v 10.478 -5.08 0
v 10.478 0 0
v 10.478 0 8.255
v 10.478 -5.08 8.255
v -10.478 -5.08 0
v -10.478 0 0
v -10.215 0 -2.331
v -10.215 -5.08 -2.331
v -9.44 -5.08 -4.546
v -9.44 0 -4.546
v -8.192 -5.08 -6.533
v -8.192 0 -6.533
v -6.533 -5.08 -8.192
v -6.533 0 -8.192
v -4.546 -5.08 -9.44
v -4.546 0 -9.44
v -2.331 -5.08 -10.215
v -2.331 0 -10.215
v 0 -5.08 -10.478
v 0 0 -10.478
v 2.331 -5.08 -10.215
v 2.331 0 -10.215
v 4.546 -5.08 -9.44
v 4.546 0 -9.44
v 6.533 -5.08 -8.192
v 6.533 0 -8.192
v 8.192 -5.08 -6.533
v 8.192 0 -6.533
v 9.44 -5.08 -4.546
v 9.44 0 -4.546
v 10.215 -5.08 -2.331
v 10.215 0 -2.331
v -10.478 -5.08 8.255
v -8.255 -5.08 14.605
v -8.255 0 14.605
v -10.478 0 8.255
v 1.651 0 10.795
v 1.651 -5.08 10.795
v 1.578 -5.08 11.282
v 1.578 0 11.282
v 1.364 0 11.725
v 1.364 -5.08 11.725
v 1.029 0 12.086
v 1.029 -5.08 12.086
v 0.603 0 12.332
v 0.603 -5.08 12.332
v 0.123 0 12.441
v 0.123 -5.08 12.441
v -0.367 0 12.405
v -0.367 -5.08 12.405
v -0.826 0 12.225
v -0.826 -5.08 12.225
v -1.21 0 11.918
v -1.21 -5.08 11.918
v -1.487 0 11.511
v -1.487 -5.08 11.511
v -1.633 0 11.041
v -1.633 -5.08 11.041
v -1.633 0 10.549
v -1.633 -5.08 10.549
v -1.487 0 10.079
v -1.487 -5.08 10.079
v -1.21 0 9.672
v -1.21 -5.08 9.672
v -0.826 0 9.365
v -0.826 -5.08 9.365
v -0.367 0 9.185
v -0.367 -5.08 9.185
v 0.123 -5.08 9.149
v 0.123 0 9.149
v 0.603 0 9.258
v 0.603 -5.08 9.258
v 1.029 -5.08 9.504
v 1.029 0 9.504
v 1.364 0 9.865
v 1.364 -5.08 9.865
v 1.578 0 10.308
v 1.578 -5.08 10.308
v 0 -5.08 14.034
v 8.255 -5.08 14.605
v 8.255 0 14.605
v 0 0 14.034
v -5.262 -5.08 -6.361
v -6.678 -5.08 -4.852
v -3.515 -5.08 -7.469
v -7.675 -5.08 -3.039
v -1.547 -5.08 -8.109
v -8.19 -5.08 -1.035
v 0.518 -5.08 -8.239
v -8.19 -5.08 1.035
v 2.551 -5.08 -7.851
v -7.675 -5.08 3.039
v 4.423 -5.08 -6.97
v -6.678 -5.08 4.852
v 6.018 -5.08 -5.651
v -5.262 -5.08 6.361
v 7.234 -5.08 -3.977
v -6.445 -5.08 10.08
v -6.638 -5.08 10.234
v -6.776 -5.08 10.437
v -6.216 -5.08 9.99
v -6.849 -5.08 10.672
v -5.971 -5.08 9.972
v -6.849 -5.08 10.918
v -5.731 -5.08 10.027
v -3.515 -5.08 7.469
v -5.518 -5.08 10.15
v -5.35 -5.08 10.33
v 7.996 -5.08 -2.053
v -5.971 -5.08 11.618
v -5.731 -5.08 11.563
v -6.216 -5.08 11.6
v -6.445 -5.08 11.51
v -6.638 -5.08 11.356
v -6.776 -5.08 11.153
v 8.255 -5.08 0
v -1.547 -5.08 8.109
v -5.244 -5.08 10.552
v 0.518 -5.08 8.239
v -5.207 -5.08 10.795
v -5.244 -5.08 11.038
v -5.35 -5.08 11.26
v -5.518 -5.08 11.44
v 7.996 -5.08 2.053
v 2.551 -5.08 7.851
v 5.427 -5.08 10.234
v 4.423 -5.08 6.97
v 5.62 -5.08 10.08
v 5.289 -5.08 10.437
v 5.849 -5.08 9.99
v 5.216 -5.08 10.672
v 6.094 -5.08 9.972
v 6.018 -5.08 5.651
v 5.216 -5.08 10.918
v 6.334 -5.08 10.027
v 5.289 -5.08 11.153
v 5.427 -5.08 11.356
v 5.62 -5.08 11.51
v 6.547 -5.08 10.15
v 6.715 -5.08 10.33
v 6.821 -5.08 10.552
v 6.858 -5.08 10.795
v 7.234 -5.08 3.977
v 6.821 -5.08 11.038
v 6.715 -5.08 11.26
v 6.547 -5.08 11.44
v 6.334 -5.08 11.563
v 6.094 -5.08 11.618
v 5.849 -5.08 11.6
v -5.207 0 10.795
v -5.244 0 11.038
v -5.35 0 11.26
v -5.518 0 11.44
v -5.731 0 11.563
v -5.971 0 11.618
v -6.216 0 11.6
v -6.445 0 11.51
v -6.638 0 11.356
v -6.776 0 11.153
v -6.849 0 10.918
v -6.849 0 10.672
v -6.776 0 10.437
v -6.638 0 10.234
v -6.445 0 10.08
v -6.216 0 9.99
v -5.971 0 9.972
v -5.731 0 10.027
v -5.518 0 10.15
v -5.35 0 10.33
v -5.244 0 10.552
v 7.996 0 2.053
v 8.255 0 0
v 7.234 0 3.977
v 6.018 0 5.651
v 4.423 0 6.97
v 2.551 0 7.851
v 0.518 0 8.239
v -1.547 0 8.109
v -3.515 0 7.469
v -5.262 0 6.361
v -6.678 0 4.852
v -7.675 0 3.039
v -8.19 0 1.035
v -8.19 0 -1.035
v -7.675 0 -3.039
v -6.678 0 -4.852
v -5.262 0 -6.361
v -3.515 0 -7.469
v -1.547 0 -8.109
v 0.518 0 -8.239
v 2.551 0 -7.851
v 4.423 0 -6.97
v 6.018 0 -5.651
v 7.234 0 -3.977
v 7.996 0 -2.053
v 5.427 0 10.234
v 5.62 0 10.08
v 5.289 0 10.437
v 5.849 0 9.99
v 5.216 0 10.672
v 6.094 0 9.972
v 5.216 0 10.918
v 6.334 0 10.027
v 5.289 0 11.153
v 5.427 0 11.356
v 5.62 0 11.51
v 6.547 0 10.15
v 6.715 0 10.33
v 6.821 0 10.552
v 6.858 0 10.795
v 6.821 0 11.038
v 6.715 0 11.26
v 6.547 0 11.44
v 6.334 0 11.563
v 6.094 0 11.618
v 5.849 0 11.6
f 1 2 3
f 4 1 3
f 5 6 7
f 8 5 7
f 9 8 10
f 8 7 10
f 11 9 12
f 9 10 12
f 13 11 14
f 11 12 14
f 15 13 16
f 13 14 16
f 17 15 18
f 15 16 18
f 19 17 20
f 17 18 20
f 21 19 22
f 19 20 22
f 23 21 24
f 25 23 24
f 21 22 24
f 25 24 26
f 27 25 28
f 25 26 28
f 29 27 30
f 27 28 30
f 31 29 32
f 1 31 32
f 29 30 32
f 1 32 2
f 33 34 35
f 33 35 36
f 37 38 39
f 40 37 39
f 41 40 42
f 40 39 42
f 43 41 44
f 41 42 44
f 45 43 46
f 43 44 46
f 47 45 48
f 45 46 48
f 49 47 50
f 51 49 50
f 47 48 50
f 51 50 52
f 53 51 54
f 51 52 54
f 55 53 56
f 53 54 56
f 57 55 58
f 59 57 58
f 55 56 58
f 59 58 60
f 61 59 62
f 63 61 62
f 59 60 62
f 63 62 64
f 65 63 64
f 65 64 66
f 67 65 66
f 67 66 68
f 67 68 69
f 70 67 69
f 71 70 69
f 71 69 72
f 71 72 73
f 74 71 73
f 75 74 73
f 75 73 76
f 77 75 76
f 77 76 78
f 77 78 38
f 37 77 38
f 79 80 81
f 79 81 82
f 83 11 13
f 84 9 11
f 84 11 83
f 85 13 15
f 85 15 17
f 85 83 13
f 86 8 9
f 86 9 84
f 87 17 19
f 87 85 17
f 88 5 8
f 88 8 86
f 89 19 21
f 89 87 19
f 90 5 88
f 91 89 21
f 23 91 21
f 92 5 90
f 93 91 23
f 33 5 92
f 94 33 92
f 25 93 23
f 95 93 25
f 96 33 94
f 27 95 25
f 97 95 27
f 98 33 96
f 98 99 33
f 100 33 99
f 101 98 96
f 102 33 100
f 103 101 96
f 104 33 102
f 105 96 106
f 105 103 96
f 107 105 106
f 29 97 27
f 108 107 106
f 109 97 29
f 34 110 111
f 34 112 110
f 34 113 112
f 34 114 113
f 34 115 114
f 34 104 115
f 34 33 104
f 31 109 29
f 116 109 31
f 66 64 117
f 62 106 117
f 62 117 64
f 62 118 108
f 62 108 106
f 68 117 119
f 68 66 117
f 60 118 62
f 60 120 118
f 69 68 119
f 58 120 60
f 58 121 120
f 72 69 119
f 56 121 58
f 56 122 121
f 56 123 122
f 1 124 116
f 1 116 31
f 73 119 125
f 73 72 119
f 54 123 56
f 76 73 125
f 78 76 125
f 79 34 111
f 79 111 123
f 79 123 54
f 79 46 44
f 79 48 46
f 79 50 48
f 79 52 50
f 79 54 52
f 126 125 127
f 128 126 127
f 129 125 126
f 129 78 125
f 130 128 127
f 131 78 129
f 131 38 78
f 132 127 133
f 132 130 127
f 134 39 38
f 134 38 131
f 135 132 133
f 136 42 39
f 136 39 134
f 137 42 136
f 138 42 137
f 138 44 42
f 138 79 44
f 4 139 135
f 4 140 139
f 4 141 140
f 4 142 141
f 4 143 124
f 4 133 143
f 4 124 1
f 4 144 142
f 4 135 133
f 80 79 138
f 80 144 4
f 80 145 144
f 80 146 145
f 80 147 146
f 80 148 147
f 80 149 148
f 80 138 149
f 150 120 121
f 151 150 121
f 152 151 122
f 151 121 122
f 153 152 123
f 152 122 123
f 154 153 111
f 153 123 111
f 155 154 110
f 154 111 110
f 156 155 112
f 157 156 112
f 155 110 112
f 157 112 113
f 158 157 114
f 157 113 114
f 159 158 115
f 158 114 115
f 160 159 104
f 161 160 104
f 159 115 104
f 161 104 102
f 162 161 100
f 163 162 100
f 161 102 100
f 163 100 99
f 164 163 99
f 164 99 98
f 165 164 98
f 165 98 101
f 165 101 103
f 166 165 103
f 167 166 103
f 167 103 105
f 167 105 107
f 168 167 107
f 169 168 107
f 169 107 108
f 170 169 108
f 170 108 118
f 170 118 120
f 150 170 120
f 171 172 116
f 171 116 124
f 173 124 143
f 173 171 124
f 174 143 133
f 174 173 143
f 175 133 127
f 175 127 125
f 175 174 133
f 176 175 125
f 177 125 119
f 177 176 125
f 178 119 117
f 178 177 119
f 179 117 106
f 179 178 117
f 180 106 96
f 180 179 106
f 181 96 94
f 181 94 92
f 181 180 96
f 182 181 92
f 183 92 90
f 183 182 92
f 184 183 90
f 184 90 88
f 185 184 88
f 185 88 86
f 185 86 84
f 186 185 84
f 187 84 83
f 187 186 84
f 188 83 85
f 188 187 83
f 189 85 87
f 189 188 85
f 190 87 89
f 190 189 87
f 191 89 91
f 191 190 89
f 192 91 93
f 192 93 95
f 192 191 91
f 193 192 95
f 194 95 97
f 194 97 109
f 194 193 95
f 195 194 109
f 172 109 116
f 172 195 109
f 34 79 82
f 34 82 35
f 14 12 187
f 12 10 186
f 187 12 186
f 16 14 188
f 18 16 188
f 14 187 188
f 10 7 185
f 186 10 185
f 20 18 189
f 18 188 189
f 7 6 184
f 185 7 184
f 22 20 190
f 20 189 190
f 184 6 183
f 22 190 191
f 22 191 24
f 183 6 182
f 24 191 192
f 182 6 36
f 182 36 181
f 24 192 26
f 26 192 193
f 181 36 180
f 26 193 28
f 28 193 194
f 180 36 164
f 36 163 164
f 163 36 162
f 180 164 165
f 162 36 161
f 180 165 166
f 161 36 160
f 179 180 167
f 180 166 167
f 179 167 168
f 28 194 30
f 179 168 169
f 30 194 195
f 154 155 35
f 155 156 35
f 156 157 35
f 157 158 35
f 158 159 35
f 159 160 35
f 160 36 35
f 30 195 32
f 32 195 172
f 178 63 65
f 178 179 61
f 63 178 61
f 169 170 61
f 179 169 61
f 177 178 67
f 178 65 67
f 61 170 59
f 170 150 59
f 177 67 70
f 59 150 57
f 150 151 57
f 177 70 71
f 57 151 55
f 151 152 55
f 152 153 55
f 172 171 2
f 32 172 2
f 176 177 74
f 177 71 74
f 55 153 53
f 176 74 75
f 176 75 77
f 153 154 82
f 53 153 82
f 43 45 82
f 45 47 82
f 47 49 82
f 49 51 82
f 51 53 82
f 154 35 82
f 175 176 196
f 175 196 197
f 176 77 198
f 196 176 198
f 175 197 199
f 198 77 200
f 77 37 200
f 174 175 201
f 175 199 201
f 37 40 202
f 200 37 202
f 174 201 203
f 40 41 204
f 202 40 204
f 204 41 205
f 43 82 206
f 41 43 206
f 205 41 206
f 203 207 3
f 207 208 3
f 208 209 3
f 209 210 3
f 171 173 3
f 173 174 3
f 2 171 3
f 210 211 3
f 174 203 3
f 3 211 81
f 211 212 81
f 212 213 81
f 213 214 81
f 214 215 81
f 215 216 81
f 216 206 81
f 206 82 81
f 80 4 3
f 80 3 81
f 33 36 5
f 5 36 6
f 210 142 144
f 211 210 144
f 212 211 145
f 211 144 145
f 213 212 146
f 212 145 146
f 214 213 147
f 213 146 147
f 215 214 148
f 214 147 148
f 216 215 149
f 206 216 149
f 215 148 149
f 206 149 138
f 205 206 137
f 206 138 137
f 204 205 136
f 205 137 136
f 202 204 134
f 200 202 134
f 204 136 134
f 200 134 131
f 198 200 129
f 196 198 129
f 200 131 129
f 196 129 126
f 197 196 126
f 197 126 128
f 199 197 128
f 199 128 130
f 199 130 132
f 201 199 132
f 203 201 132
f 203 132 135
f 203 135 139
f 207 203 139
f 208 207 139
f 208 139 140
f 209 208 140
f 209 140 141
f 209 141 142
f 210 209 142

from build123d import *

# Parameters (mm, degrees)
F0_R     = 8.255
F1_DEPTH = 5.08
F3_DEPTH = 5.08
F4_R     = 1.651
F4_R_2   = 0.8255
F5_DEPTH = 25.4


with BuildPart() as f1:
    # F0 (on Front) → F1 (new body)
    with BuildSketch(Plane.XZ):
        with BuildLine():
            ThreePointArc((-10.4775, 0), (0, 10.4775), (10.4775, 0))
            Line((10.4775, 0), (10.4775, 8.255))
            Line((10.4775, 8.255), (6.0325, 10.795))
            Line((6.0325, 10.795), (-6.0325, 10.795))
            Line((-6.0325, 10.795), (-10.4775, 8.255))
            Line((-10.4775, 8.255), (-10.4775, 0))
        make_face()
        with BuildLine():
            ThreePointArc((-10.4775, 0), (0, -10.4775), (10.4775, 0))
            ThreePointArc((10.4775, 0), (0, 10.4775), (-10.4775, 0))
        make_face()
        Circle(F0_R, mode=Mode.SUBTRACT)
    extrude(amount=F1_DEPTH)

    # F2 (on face) → F3 (join)
    with BuildSketch(Plane.XZ.offset(5.08)):
        Polygon((0, 14.0335), (-8.255, 14.605), (-10.4775, 8.255), (-6.0325, 10.795), (6.0325, 10.795), (10.4775, 8.255), (8.255, 14.605), align=None)
    extrude(amount=-F3_DEPTH)

    # F4 (on face) → F5 (cut)
    with BuildSketch(Plane.XZ.offset(5.08)):
        with Locations((0, 10.795)):
            Circle(F4_R)
        with Locations((6.0325, 10.795)):
            Circle(F4_R_2)
        with Locations((-6.0325, 10.795)):
            Circle(F4_R_2)
    extrude(amount=-F5_DEPTH, mode=Mode.SUBTRACT)


solid = f1.part
